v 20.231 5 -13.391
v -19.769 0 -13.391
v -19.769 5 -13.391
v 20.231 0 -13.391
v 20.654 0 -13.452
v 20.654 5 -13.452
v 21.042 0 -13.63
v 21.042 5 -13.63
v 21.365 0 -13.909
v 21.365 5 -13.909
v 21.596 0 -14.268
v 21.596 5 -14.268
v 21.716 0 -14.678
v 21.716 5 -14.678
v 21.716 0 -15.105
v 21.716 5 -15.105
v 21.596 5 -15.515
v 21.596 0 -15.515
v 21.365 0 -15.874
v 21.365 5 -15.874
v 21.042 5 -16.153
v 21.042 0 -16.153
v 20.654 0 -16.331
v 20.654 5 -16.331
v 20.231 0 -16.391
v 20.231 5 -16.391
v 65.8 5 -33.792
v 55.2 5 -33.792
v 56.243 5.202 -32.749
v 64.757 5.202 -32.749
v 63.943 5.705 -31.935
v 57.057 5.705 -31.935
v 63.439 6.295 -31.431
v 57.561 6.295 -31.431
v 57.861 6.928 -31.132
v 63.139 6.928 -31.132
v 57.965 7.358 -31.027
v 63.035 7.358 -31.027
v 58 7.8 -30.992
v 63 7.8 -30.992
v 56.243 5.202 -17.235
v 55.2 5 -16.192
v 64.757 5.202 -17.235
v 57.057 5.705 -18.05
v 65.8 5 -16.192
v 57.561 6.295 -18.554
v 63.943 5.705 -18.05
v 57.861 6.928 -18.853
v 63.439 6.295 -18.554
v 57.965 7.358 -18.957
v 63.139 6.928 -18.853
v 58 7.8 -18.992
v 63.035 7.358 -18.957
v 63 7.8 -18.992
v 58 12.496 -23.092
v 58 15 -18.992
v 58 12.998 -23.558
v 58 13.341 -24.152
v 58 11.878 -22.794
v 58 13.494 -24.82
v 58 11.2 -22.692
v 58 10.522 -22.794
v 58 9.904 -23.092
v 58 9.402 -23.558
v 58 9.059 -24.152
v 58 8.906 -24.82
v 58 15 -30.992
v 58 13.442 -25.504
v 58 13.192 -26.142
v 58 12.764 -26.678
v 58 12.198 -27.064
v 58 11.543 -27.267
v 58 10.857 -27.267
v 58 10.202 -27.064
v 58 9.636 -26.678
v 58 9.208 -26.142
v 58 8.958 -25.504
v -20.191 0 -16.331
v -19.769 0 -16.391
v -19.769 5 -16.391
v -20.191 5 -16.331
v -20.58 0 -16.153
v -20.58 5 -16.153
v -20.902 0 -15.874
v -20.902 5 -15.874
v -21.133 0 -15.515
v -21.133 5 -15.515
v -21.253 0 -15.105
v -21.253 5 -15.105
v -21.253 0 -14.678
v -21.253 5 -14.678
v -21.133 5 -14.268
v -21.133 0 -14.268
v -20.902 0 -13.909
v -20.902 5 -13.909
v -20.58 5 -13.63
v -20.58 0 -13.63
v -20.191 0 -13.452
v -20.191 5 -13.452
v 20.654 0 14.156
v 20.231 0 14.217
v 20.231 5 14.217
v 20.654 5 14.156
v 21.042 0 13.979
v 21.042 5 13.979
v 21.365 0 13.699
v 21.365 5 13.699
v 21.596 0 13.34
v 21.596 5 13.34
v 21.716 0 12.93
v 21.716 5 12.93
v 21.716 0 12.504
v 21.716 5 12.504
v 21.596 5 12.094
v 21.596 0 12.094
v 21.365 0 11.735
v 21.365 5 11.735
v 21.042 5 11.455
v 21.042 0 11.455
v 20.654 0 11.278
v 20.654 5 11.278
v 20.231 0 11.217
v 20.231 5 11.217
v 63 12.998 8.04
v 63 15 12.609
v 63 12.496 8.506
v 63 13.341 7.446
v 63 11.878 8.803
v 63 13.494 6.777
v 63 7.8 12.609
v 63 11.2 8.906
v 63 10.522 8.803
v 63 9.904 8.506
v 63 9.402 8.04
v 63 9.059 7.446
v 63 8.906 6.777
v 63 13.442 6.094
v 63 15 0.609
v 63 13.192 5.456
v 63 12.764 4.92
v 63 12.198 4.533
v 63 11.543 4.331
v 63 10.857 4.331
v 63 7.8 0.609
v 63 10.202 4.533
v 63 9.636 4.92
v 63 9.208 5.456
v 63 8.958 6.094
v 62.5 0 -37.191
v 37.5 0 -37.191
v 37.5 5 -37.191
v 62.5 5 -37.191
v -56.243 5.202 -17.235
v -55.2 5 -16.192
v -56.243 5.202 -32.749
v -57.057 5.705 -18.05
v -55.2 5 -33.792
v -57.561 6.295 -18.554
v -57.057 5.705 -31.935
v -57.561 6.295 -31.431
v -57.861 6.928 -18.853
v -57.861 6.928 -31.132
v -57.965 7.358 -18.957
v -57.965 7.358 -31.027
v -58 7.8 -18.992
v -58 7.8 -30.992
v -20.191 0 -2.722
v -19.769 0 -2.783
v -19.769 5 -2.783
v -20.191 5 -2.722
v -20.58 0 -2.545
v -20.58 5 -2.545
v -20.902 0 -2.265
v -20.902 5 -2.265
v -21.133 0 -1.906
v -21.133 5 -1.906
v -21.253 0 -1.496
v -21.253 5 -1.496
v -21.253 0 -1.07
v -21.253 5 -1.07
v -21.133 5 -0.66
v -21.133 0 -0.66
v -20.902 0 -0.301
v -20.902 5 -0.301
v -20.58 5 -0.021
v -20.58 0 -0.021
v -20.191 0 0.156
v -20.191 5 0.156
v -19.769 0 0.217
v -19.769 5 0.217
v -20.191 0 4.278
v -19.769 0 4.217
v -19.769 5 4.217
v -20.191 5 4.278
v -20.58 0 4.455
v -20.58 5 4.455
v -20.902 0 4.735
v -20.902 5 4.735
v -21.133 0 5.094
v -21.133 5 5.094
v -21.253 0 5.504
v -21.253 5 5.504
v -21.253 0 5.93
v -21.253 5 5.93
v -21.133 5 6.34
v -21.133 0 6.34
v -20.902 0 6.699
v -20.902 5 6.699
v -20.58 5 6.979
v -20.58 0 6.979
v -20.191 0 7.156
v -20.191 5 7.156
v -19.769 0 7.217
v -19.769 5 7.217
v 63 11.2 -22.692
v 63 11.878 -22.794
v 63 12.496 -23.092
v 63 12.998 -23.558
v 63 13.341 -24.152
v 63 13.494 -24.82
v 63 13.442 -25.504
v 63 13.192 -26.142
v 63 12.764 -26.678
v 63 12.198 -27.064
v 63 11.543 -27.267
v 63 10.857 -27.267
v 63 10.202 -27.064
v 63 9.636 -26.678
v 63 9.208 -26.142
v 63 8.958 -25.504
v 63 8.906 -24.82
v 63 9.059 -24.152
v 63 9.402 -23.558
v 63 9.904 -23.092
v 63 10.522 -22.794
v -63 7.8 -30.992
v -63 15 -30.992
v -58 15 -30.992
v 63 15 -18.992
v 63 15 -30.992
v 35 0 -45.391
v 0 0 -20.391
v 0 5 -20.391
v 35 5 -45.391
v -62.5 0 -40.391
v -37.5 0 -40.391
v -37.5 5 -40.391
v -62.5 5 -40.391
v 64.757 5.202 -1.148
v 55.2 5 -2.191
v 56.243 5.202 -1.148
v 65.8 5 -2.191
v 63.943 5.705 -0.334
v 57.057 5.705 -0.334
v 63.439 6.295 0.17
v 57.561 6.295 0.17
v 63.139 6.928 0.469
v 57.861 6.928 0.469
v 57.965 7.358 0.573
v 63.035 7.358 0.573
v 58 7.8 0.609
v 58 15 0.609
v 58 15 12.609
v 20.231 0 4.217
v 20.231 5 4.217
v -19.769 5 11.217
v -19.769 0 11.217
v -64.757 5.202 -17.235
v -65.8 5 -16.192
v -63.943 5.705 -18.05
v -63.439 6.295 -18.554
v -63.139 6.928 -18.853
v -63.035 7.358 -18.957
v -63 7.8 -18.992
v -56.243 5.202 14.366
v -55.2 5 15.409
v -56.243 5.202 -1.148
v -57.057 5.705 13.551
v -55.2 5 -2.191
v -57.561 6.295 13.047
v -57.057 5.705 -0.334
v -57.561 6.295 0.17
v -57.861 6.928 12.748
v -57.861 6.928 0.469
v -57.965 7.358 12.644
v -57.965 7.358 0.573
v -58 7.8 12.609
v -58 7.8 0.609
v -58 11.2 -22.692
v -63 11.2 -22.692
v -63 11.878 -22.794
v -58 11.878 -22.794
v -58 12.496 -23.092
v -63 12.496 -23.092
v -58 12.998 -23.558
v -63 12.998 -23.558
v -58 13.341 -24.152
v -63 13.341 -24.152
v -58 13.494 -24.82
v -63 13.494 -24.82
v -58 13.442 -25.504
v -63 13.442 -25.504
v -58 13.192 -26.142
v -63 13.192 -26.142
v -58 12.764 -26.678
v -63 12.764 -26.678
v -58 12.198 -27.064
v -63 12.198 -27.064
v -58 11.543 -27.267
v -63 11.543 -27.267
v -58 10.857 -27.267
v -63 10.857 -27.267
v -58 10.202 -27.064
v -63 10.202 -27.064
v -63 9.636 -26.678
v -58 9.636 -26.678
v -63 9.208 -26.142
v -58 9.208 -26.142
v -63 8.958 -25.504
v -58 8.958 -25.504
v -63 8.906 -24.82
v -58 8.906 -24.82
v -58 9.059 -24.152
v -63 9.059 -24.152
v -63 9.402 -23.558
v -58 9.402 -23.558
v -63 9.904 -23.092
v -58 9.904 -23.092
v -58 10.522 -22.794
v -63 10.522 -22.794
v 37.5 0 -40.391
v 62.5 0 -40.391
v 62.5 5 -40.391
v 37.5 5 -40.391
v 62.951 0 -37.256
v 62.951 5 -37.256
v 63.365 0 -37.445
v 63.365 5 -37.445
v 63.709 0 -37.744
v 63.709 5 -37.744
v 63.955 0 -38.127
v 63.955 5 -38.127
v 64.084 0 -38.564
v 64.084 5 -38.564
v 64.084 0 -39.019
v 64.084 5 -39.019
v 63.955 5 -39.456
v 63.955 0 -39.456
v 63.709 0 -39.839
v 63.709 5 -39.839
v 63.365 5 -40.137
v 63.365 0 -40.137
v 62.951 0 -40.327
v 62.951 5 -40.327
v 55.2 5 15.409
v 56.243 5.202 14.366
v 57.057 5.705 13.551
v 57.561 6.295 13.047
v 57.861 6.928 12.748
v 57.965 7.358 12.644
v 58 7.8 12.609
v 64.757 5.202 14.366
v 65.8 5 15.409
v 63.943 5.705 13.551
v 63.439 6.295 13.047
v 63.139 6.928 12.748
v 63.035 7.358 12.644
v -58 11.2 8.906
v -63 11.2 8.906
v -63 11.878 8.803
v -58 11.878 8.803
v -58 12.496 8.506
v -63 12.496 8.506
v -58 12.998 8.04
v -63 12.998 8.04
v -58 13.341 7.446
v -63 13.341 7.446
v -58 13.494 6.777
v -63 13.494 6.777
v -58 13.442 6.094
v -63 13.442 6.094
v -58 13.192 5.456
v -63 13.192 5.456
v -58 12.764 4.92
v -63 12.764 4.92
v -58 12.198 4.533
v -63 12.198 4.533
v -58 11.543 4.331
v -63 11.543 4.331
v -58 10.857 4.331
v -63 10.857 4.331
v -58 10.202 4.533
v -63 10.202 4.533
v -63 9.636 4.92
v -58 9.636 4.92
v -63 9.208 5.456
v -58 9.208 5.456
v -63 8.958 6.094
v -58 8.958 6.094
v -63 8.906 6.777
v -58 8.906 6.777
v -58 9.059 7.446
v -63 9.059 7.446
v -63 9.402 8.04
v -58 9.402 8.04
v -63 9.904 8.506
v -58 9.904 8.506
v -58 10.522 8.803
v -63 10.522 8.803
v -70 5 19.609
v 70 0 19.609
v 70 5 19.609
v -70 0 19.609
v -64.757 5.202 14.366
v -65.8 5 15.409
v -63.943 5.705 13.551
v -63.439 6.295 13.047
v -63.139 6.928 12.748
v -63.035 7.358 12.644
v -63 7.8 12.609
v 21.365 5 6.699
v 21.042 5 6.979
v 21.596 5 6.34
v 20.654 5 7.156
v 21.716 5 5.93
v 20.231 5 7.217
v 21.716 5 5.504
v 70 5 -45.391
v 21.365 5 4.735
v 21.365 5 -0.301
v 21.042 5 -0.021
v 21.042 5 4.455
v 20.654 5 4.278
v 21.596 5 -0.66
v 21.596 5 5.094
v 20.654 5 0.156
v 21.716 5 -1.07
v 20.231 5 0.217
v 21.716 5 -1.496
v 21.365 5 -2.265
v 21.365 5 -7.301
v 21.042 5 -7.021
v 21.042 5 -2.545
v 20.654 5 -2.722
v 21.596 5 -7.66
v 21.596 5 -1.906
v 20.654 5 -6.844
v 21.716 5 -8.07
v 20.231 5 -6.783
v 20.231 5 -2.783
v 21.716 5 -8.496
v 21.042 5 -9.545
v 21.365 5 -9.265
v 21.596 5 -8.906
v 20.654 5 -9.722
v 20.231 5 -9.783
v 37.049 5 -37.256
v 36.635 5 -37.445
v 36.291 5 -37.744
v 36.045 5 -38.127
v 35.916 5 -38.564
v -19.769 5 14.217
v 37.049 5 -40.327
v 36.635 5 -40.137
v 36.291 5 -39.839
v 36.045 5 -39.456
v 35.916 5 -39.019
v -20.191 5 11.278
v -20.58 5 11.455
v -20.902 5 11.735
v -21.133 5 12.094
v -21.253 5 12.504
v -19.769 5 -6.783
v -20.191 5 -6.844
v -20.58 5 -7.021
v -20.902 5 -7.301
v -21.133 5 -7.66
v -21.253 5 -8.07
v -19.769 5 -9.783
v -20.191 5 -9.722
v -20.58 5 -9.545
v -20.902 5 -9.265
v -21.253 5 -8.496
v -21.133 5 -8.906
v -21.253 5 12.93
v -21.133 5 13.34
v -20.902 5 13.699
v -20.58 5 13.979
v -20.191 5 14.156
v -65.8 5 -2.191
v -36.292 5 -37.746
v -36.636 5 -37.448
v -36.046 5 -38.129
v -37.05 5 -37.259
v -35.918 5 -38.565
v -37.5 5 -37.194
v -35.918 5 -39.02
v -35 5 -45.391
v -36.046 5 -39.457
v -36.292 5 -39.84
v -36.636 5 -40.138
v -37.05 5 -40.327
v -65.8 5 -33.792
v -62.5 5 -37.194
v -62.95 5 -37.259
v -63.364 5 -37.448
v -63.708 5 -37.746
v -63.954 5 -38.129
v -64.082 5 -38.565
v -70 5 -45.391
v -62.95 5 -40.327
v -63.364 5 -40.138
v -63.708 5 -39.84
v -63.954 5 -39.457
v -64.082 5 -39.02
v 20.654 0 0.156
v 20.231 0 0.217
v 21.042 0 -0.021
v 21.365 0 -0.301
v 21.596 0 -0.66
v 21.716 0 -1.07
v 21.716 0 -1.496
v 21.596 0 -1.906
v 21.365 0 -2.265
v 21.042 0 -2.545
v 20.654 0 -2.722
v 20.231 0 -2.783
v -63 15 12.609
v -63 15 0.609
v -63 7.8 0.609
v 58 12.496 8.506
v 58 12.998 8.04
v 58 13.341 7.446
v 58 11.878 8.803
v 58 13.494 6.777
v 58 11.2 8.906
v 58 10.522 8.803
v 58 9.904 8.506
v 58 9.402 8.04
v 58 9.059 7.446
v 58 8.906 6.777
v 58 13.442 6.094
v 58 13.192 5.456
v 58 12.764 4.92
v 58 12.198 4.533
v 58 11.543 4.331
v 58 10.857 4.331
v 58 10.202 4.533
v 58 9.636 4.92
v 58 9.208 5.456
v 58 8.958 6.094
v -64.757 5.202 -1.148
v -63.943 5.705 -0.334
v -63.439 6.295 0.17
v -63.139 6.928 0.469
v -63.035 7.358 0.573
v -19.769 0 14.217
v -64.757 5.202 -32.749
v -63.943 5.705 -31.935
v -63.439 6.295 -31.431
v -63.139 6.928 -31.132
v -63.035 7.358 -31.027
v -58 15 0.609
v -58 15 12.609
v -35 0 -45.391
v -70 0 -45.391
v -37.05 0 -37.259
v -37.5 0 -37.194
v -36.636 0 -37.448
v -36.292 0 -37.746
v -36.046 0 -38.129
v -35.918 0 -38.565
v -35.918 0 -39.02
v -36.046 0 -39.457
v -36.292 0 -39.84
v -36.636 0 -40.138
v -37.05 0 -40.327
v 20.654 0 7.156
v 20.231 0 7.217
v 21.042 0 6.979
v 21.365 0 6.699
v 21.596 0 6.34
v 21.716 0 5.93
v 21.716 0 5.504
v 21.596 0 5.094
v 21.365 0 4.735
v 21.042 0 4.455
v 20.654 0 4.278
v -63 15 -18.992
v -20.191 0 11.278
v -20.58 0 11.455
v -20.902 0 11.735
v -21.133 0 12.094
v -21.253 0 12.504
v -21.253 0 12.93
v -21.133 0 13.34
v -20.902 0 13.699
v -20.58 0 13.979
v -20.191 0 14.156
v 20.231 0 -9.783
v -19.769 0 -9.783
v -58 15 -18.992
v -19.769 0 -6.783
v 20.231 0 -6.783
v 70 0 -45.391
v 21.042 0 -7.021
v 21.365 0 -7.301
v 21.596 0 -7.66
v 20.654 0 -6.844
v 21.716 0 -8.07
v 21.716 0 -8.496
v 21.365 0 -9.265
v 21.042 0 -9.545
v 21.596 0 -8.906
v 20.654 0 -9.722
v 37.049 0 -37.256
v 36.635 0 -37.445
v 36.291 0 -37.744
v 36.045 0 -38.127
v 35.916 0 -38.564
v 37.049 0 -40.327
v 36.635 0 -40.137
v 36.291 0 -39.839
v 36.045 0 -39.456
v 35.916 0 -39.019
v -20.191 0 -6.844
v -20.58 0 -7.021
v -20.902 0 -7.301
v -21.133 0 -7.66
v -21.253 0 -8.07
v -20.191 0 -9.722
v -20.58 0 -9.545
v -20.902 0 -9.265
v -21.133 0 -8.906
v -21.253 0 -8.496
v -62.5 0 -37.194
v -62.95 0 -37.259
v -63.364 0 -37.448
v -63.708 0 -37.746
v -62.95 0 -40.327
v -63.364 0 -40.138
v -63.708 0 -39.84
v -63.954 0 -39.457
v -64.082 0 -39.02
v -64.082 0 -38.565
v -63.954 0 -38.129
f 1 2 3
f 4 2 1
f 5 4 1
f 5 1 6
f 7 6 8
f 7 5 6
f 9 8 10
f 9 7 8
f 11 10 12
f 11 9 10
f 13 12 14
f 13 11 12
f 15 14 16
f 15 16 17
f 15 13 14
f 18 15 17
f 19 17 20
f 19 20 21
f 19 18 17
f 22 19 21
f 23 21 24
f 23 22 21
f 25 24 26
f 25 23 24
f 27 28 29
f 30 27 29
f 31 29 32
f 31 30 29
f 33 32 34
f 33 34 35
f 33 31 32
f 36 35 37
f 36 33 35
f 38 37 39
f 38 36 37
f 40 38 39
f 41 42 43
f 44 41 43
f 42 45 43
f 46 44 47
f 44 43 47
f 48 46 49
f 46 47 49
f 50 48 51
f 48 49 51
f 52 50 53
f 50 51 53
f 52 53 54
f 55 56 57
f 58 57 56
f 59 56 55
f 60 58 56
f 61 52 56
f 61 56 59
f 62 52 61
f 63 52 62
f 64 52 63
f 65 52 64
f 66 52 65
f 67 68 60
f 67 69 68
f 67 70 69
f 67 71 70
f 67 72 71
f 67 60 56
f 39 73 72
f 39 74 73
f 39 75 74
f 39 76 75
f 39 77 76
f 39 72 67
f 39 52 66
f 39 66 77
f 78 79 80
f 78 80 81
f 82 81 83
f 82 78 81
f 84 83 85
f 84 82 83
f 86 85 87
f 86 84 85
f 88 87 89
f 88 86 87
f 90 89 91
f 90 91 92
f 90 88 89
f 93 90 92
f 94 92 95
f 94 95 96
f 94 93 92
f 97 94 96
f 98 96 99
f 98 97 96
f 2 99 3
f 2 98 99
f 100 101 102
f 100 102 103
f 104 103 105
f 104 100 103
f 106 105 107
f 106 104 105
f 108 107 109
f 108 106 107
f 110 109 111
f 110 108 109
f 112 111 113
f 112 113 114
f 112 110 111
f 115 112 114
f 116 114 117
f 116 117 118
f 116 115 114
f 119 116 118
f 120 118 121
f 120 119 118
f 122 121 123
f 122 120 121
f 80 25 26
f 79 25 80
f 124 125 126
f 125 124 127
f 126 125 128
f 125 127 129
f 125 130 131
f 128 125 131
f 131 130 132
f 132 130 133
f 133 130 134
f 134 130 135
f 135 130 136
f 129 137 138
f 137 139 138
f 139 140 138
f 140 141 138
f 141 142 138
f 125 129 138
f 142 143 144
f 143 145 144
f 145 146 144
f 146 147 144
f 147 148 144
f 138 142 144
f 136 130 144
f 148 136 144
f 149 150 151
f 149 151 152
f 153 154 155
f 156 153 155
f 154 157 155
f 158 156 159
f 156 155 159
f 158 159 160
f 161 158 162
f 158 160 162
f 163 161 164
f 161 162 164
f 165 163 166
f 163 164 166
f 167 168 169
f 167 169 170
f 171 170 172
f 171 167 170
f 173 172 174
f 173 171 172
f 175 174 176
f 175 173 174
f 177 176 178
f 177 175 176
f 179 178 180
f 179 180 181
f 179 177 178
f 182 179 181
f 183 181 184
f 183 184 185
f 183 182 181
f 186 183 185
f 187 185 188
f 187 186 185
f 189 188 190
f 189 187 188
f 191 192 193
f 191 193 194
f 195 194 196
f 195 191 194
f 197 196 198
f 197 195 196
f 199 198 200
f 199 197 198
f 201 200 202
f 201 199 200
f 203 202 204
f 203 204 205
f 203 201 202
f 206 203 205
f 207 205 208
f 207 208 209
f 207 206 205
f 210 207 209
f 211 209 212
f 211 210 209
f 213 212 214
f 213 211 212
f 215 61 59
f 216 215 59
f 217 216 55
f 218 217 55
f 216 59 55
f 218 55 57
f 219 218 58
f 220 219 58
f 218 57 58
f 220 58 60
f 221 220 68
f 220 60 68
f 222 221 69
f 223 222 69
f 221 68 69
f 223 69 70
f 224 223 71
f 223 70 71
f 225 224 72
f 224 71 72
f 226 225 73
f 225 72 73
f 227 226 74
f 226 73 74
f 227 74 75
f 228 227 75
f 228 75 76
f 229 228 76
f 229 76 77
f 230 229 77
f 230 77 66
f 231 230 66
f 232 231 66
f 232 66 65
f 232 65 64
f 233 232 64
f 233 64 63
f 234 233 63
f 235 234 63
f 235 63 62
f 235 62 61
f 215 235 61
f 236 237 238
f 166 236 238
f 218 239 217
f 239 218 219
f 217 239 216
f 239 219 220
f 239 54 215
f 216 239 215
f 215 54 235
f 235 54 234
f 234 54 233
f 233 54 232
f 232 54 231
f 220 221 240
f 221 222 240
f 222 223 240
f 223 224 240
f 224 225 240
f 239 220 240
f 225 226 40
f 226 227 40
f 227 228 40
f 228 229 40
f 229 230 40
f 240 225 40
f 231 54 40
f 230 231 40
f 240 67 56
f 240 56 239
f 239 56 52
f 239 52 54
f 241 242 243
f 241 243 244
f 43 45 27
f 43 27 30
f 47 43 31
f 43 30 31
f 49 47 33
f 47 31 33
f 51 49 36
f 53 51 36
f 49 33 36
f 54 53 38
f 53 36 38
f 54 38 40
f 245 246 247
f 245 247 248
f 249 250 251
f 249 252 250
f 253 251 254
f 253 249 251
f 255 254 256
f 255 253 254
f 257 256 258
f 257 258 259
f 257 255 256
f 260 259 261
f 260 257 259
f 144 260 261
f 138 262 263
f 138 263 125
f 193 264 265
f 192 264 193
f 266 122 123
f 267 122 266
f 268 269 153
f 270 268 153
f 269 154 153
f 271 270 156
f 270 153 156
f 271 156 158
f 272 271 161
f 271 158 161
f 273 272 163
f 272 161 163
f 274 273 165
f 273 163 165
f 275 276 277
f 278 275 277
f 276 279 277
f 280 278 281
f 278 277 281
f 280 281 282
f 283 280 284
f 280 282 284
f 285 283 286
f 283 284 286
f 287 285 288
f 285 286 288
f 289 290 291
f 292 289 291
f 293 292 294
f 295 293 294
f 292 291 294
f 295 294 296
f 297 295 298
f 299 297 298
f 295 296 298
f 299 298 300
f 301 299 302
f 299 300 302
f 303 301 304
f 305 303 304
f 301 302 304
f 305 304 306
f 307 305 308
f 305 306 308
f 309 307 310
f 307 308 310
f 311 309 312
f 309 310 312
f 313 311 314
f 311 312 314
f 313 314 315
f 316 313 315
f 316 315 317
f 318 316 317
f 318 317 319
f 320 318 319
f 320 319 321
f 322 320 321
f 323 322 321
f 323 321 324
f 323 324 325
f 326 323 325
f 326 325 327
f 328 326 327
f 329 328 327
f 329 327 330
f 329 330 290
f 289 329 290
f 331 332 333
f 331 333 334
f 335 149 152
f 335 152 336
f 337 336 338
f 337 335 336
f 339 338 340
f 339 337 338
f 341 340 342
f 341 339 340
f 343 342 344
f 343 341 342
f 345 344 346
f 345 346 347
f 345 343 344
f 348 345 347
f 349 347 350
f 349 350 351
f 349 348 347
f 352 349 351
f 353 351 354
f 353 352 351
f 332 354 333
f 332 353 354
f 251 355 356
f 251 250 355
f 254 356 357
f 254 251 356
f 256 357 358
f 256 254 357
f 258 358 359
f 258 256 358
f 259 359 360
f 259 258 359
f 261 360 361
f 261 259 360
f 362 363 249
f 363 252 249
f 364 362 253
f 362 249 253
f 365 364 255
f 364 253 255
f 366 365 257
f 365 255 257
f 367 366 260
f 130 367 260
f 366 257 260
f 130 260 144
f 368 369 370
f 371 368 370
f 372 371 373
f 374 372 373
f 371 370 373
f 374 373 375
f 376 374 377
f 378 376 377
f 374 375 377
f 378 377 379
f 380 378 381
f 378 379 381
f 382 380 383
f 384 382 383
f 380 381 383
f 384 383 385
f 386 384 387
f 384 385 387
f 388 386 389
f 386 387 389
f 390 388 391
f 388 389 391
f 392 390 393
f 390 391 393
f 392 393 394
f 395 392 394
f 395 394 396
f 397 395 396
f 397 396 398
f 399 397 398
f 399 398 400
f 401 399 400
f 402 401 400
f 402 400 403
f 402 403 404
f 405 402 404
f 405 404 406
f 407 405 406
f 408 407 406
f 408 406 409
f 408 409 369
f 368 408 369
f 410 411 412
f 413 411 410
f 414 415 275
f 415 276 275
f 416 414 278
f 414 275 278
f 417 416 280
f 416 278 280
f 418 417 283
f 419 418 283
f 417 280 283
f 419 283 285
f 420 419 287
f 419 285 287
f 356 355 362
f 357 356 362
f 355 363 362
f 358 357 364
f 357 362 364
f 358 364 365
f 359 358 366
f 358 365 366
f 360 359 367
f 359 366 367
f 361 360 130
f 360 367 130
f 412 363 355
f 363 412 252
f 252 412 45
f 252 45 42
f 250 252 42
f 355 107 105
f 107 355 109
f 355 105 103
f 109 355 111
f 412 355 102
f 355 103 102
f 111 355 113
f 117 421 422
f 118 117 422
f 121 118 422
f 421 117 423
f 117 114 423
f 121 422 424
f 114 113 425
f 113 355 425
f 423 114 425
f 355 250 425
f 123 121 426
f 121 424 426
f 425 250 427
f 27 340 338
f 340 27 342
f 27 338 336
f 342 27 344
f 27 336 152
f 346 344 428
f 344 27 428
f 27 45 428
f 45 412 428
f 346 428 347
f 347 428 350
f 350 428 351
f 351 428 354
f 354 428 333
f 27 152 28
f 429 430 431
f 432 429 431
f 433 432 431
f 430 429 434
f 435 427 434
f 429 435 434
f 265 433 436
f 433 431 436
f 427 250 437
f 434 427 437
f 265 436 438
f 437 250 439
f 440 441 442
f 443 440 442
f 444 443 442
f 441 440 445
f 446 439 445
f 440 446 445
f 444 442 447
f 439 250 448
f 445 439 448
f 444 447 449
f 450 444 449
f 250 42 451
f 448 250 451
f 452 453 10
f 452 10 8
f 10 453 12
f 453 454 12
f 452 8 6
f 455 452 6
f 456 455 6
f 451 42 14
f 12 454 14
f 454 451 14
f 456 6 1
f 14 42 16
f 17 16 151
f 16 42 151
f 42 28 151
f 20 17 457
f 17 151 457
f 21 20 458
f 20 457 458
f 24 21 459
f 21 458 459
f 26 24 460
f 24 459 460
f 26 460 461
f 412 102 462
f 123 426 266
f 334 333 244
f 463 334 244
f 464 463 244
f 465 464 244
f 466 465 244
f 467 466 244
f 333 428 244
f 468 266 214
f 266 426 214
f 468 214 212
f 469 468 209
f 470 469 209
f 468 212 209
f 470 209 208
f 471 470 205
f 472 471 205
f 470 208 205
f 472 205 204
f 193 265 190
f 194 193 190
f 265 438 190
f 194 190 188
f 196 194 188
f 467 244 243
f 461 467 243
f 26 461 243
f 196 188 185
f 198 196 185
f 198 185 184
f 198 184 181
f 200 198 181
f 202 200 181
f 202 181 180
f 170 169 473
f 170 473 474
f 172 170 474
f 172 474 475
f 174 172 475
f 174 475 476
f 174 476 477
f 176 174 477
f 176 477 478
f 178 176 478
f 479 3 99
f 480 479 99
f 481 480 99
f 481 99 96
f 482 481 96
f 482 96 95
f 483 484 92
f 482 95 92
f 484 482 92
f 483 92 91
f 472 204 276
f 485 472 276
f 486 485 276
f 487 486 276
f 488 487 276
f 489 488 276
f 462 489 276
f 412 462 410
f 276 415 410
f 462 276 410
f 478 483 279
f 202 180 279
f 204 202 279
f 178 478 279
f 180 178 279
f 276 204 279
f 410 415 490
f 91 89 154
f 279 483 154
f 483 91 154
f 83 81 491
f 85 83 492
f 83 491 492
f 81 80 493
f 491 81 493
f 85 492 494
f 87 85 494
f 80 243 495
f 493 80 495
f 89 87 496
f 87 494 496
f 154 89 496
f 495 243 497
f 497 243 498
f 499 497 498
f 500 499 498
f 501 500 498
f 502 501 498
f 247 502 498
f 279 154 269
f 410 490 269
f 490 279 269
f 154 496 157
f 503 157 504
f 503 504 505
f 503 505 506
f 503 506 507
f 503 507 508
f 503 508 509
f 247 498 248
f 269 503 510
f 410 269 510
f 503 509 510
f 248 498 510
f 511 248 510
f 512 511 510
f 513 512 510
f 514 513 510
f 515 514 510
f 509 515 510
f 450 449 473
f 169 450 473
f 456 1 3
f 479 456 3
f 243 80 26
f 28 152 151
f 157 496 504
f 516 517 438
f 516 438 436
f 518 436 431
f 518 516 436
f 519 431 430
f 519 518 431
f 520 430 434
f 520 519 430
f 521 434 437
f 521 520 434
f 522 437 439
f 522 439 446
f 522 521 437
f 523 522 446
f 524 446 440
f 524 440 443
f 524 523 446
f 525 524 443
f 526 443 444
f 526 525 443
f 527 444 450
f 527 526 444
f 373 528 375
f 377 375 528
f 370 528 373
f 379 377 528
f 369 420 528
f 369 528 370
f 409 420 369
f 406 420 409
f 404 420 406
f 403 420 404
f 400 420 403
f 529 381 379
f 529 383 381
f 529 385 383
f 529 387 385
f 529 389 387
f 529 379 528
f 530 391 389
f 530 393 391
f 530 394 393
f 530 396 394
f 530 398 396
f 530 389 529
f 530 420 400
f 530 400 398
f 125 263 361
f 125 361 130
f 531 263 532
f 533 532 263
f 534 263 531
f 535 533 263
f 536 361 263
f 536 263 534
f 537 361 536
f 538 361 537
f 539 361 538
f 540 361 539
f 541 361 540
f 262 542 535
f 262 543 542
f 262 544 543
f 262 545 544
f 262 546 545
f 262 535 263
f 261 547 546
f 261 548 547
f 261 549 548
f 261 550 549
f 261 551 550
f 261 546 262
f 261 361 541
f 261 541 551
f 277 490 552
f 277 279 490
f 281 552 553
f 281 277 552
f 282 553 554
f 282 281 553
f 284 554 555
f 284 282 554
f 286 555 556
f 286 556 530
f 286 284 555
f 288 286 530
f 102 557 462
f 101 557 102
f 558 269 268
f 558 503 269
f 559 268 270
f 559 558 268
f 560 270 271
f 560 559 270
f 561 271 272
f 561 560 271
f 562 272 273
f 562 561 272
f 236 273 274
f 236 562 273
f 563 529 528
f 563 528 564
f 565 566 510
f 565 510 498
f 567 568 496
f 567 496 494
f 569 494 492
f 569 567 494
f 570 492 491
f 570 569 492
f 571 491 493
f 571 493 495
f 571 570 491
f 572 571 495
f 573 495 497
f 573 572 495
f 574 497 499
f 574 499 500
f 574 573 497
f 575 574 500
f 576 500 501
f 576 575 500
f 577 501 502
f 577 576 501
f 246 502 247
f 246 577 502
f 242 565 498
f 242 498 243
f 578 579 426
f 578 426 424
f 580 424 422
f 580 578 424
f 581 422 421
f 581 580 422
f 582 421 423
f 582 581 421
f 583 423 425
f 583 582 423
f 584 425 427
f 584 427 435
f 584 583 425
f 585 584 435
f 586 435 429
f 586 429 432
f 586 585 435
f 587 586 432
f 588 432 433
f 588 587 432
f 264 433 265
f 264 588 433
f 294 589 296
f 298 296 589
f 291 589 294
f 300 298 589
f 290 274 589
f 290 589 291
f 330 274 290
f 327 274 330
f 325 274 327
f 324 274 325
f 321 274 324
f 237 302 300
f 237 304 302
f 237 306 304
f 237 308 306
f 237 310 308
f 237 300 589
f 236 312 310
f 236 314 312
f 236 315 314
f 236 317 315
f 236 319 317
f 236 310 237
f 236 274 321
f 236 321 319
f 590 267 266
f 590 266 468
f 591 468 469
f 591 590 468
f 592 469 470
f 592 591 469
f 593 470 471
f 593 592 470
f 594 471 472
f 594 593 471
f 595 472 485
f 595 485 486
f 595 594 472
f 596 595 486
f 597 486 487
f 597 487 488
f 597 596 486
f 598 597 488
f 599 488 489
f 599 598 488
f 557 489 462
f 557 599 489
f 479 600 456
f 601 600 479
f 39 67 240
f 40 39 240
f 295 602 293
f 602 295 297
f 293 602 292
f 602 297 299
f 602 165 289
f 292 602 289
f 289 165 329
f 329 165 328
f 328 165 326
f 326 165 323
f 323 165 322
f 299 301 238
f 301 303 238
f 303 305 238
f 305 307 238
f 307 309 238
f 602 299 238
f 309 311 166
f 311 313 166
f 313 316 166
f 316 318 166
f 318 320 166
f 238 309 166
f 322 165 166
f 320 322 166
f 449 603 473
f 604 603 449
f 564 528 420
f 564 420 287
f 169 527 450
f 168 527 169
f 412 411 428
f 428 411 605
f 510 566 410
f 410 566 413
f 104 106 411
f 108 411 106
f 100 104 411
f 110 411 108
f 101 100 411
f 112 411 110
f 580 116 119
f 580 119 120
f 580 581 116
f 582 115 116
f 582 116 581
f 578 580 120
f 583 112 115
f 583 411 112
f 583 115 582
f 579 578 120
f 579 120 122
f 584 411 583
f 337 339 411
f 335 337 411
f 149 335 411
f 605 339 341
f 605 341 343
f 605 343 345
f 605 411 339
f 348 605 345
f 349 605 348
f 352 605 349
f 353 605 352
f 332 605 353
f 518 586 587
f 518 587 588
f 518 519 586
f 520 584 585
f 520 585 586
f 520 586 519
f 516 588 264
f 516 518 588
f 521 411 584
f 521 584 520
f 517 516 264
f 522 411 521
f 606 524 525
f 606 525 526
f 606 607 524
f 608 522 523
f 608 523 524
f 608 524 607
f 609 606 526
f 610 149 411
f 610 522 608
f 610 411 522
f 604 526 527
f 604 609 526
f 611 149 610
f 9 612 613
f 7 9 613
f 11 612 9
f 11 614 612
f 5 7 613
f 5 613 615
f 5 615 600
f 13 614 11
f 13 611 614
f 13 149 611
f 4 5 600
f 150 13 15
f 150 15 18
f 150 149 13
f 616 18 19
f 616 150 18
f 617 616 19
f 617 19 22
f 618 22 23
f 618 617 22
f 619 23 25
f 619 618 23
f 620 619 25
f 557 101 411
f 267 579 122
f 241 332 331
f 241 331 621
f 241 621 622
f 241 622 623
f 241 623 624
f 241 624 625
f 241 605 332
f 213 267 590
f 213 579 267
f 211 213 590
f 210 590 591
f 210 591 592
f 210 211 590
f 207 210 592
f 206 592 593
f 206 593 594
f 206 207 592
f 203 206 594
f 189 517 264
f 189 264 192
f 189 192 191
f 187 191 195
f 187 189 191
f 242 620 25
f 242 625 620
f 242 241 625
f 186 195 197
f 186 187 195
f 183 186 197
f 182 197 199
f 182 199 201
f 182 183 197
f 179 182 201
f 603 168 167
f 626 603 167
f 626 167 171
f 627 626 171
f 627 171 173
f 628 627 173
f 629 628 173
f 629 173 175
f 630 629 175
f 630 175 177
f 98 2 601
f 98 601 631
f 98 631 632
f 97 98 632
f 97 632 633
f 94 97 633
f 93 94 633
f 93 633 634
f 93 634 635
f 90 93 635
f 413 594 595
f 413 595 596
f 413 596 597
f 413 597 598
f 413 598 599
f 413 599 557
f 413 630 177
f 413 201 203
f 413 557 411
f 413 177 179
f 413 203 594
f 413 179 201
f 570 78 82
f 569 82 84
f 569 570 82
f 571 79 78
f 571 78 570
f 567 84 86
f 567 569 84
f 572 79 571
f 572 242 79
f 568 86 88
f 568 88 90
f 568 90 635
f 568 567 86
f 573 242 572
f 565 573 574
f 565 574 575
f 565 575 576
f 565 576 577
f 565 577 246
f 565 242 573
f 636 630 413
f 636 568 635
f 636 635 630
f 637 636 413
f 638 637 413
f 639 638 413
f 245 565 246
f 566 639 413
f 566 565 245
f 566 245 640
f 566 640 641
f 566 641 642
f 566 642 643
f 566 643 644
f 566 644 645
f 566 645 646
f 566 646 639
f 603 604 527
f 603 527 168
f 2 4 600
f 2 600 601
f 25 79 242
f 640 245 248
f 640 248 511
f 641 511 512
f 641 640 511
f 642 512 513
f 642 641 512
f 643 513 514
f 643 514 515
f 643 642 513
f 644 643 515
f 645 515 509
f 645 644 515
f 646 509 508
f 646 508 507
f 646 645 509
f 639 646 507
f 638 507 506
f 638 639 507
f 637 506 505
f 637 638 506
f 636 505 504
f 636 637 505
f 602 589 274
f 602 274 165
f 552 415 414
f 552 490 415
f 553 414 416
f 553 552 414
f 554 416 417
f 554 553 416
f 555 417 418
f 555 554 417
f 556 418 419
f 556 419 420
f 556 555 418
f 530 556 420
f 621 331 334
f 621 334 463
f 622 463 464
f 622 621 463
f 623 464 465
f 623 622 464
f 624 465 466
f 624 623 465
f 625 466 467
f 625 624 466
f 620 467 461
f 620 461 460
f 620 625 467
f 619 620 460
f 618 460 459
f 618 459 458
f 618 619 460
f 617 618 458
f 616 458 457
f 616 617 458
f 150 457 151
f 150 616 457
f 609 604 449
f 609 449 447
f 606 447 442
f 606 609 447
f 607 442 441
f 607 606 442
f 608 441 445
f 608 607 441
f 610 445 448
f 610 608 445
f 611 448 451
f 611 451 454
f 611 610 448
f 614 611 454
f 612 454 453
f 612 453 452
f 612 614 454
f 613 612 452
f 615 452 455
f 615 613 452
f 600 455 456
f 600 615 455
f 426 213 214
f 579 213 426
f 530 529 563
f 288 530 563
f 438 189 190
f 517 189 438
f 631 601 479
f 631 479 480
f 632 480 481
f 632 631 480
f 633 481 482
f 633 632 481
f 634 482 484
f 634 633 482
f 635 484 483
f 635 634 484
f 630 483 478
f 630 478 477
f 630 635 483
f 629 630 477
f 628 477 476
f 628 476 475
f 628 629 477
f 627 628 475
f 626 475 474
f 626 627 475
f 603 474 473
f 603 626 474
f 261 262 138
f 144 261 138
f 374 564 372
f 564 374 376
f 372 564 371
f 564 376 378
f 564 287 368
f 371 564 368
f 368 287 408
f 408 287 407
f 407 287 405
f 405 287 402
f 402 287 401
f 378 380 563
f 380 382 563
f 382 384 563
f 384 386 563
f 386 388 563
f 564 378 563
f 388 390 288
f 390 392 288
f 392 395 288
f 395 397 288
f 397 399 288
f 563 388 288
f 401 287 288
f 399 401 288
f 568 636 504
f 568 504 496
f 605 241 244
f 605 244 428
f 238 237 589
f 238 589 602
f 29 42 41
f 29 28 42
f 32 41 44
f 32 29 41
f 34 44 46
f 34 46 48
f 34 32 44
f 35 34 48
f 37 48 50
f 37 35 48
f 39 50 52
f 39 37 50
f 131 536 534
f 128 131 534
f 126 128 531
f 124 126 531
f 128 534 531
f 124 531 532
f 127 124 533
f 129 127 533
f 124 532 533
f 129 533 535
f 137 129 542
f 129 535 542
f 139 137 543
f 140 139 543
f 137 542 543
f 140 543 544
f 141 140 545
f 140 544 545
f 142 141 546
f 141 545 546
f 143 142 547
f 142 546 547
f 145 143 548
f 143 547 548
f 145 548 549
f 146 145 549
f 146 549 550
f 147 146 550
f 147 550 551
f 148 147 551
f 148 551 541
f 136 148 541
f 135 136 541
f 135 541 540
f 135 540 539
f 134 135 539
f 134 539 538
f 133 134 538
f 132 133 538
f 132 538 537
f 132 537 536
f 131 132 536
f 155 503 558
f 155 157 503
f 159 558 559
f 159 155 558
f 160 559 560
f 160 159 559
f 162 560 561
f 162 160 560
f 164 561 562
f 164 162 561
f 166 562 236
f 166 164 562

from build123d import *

# Parameters (mm, degrees)
BOSS_EXTRU_1_DEPTH      = 5
ESQUISSE3_W             = 5
ESQUISSE3_H             = 12
BOSS_EXTRU_2_DEPTH      = 10
ESQUISSE4_R             = 2.3
ENL_V_MAT_EXTRU_1_DEPTH = 142.330773303
CONG_1_R                = 2.8


with BuildPart() as part:
    # Esquisse1 → Boss.-Extru.1 (new body)
    with BuildSketch(Plane(origin=(0, 0, 0), x_dir=(1, 0, 0), z_dir=(0, 1, 0))):
        Polygon((70, 45.391491299), (70, 20.391491299), (70, -19.608508701), (-70, -19.608508701), (-70, 20.391491299), (-70, 45.391491299), (-35, 45.391491299), (0, 20.391491299), (35, 45.391491299), align=None)
        with BuildLine():
            ThreePointArc((62.5, 37.191491299), (64.1, 38.791491299), (62.5, 40.391491299))
            Line((62.5, 40.391491299), (37.5, 40.391491299))
            ThreePointArc((37.5, 40.391491299), (35.9, 38.791491299), (37.5, 37.191491299))
            Line((37.5, 37.191491299), (62.5, 37.191491299))
        make_face(mode=Mode.SUBTRACT)
        with BuildLine():
            ThreePointArc((-37.5, 37.194239818), (-35.90137426, 38.792865558), (-37.5, 40.391491299))
            Line((-37.5, 40.391491299), (-62.5, 40.391491299))
            ThreePointArc((-62.5, 40.391491299), (-64.09862574, 38.792865558), (-62.5, 37.194239818))
            Line((-62.5, 37.194239818), (-37.5, 37.194239818))
        make_face(mode=Mode.SUBTRACT)
        with BuildLine():
            ThreePointArc((20.231404284, -14.217017403), (21.731404284, -12.717017403), (20.231404284, -11.217017403))
            Line((20.231404284, -11.217017403), (-19.768595716, -11.217017403))
            ThreePointArc((-19.768595716, -11.217017403), (-21.268595716, -12.717017403), (-19.768595716, -14.217017403))
            Line((-19.768595716, -14.217017403), (20.231404284, -14.217017403))
        make_face(mode=Mode.SUBTRACT)
        with BuildLine():
            ThreePointArc((20.231404284, -7.217017403), (21.731404284, -5.717017403), (20.231404284, -4.217017403))
            Line((20.231404284, -4.217017403), (-19.768595716, -4.217017403))
            ThreePointArc((-19.768595716, -4.217017403), (-21.268595716, -5.717017403), (-19.768595716, -7.217017403))
            Line((-19.768595716, -7.217017403), (20.231404284, -7.217017403))
        make_face(mode=Mode.SUBTRACT)
        with BuildLine():
            ThreePointArc((20.231404284, 13.391491299), (21.731404284, 14.891491299), (20.231404284, 16.391491299))
            Line((20.231404284, 16.391491299), (-19.768595716, 16.391491299))
            ThreePointArc((-19.768595716, 16.391491299), (-21.268595716, 14.891491299), (-19.768595716, 13.391491299))
            Line((-19.768595716, 13.391491299), (20.231404284, 13.391491299))
        make_face(mode=Mode.SUBTRACT)
        with BuildLine():
            ThreePointArc((20.231404284, 6.782982597), (21.731404284, 8.282982597), (20.231404284, 9.782982597))
            Line((20.231404284, 9.782982597), (-19.768595716, 9.782982597))
            ThreePointArc((-19.768595716, 9.782982597), (-21.268595716, 8.282982597), (-19.768595716, 6.782982597))
            Line((-19.768595716, 6.782982597), (20.231404284, 6.782982597))
        make_face(mode=Mode.SUBTRACT)
        with BuildLine():
            ThreePointArc((20.231404284, -0.217017403), (21.731404284, 1.282982597), (20.231404284, 2.782982597))
            Line((20.231404284, 2.782982597), (-19.768595716, 2.782982597))
            ThreePointArc((-19.768595716, 2.782982597), (-21.268595716, 1.282982597), (-19.768595716, -0.217017403))
            Line((-19.768595716, -0.217017403), (20.231404284, -0.217017403))
        make_face(mode=Mode.SUBTRACT)
    extrude(amount=BOSS_EXTRU_1_DEPTH)

    # Esquisse3 → Boss.-Extru.2 (add)
    with BuildSketch(Plane(origin=(0, 5, 0), x_dir=(1, 0, 0), z_dir=(0, 1, 0))):
        with Locations((-60.5, 24.992228824)):
            Rectangle(ESQUISSE3_W, ESQUISSE3_H)
        with Locations((-60.5, -6.608508701)):
            Rectangle(ESQUISSE3_W, ESQUISSE3_H)
        with Locations((60.5, -6.608508701)):
            Rectangle(ESQUISSE3_W, ESQUISSE3_H)
        with Locations((60.5, 24.992228824)):
            Rectangle(ESQUISSE3_W, ESQUISSE3_H)
    extrude(amount=BOSS_EXTRU_2_DEPTH)

    # Esquisse4 → Enlèv. mat.-Extru.1 (cut, through all)
    with BuildSketch(Plane.ZY.offset(63)):
        with Locations((-24.992228824, 11.2)):
            Circle(ESQUISSE4_R)
        with Locations((6.605588836, 11.2)):
            Circle(ESQUISSE4_R)
    extrude(amount=-ENL_V_MAT_EXTRU_1_DEPTH, mode=Mode.SUBTRACT)

    # Congé1
    cong_1_edges = [part.edges().sort_by_distance(p)[0] for p in [
        (-63, 5, -24.992228824),
        (-60.5, 5, -18.992228824),
        (-58, 5, -24.992228824),
        (-60.5, 5, -30.992228824),
        (-63, 5, 6.608508701),
        (-60.5, 5, 12.608508701),
        (-58, 5, 6.608508701),
        (-60.5, 5, 0.608508701),
        (60.5, 5, 0.608508701),
        (58, 5, 6.608508701),
        (60.5, 5, 12.608508701),
        (63, 5, 6.608508701),
        (63, 5, -24.992228824),
        (60.5, 5, -30.992228824),
        (58, 5, -24.992228824),
        (60.5, 5, -18.992228824),
    ]]
    fillet(cong_1_edges, radius=CONG_1_R)


solid = part.part
